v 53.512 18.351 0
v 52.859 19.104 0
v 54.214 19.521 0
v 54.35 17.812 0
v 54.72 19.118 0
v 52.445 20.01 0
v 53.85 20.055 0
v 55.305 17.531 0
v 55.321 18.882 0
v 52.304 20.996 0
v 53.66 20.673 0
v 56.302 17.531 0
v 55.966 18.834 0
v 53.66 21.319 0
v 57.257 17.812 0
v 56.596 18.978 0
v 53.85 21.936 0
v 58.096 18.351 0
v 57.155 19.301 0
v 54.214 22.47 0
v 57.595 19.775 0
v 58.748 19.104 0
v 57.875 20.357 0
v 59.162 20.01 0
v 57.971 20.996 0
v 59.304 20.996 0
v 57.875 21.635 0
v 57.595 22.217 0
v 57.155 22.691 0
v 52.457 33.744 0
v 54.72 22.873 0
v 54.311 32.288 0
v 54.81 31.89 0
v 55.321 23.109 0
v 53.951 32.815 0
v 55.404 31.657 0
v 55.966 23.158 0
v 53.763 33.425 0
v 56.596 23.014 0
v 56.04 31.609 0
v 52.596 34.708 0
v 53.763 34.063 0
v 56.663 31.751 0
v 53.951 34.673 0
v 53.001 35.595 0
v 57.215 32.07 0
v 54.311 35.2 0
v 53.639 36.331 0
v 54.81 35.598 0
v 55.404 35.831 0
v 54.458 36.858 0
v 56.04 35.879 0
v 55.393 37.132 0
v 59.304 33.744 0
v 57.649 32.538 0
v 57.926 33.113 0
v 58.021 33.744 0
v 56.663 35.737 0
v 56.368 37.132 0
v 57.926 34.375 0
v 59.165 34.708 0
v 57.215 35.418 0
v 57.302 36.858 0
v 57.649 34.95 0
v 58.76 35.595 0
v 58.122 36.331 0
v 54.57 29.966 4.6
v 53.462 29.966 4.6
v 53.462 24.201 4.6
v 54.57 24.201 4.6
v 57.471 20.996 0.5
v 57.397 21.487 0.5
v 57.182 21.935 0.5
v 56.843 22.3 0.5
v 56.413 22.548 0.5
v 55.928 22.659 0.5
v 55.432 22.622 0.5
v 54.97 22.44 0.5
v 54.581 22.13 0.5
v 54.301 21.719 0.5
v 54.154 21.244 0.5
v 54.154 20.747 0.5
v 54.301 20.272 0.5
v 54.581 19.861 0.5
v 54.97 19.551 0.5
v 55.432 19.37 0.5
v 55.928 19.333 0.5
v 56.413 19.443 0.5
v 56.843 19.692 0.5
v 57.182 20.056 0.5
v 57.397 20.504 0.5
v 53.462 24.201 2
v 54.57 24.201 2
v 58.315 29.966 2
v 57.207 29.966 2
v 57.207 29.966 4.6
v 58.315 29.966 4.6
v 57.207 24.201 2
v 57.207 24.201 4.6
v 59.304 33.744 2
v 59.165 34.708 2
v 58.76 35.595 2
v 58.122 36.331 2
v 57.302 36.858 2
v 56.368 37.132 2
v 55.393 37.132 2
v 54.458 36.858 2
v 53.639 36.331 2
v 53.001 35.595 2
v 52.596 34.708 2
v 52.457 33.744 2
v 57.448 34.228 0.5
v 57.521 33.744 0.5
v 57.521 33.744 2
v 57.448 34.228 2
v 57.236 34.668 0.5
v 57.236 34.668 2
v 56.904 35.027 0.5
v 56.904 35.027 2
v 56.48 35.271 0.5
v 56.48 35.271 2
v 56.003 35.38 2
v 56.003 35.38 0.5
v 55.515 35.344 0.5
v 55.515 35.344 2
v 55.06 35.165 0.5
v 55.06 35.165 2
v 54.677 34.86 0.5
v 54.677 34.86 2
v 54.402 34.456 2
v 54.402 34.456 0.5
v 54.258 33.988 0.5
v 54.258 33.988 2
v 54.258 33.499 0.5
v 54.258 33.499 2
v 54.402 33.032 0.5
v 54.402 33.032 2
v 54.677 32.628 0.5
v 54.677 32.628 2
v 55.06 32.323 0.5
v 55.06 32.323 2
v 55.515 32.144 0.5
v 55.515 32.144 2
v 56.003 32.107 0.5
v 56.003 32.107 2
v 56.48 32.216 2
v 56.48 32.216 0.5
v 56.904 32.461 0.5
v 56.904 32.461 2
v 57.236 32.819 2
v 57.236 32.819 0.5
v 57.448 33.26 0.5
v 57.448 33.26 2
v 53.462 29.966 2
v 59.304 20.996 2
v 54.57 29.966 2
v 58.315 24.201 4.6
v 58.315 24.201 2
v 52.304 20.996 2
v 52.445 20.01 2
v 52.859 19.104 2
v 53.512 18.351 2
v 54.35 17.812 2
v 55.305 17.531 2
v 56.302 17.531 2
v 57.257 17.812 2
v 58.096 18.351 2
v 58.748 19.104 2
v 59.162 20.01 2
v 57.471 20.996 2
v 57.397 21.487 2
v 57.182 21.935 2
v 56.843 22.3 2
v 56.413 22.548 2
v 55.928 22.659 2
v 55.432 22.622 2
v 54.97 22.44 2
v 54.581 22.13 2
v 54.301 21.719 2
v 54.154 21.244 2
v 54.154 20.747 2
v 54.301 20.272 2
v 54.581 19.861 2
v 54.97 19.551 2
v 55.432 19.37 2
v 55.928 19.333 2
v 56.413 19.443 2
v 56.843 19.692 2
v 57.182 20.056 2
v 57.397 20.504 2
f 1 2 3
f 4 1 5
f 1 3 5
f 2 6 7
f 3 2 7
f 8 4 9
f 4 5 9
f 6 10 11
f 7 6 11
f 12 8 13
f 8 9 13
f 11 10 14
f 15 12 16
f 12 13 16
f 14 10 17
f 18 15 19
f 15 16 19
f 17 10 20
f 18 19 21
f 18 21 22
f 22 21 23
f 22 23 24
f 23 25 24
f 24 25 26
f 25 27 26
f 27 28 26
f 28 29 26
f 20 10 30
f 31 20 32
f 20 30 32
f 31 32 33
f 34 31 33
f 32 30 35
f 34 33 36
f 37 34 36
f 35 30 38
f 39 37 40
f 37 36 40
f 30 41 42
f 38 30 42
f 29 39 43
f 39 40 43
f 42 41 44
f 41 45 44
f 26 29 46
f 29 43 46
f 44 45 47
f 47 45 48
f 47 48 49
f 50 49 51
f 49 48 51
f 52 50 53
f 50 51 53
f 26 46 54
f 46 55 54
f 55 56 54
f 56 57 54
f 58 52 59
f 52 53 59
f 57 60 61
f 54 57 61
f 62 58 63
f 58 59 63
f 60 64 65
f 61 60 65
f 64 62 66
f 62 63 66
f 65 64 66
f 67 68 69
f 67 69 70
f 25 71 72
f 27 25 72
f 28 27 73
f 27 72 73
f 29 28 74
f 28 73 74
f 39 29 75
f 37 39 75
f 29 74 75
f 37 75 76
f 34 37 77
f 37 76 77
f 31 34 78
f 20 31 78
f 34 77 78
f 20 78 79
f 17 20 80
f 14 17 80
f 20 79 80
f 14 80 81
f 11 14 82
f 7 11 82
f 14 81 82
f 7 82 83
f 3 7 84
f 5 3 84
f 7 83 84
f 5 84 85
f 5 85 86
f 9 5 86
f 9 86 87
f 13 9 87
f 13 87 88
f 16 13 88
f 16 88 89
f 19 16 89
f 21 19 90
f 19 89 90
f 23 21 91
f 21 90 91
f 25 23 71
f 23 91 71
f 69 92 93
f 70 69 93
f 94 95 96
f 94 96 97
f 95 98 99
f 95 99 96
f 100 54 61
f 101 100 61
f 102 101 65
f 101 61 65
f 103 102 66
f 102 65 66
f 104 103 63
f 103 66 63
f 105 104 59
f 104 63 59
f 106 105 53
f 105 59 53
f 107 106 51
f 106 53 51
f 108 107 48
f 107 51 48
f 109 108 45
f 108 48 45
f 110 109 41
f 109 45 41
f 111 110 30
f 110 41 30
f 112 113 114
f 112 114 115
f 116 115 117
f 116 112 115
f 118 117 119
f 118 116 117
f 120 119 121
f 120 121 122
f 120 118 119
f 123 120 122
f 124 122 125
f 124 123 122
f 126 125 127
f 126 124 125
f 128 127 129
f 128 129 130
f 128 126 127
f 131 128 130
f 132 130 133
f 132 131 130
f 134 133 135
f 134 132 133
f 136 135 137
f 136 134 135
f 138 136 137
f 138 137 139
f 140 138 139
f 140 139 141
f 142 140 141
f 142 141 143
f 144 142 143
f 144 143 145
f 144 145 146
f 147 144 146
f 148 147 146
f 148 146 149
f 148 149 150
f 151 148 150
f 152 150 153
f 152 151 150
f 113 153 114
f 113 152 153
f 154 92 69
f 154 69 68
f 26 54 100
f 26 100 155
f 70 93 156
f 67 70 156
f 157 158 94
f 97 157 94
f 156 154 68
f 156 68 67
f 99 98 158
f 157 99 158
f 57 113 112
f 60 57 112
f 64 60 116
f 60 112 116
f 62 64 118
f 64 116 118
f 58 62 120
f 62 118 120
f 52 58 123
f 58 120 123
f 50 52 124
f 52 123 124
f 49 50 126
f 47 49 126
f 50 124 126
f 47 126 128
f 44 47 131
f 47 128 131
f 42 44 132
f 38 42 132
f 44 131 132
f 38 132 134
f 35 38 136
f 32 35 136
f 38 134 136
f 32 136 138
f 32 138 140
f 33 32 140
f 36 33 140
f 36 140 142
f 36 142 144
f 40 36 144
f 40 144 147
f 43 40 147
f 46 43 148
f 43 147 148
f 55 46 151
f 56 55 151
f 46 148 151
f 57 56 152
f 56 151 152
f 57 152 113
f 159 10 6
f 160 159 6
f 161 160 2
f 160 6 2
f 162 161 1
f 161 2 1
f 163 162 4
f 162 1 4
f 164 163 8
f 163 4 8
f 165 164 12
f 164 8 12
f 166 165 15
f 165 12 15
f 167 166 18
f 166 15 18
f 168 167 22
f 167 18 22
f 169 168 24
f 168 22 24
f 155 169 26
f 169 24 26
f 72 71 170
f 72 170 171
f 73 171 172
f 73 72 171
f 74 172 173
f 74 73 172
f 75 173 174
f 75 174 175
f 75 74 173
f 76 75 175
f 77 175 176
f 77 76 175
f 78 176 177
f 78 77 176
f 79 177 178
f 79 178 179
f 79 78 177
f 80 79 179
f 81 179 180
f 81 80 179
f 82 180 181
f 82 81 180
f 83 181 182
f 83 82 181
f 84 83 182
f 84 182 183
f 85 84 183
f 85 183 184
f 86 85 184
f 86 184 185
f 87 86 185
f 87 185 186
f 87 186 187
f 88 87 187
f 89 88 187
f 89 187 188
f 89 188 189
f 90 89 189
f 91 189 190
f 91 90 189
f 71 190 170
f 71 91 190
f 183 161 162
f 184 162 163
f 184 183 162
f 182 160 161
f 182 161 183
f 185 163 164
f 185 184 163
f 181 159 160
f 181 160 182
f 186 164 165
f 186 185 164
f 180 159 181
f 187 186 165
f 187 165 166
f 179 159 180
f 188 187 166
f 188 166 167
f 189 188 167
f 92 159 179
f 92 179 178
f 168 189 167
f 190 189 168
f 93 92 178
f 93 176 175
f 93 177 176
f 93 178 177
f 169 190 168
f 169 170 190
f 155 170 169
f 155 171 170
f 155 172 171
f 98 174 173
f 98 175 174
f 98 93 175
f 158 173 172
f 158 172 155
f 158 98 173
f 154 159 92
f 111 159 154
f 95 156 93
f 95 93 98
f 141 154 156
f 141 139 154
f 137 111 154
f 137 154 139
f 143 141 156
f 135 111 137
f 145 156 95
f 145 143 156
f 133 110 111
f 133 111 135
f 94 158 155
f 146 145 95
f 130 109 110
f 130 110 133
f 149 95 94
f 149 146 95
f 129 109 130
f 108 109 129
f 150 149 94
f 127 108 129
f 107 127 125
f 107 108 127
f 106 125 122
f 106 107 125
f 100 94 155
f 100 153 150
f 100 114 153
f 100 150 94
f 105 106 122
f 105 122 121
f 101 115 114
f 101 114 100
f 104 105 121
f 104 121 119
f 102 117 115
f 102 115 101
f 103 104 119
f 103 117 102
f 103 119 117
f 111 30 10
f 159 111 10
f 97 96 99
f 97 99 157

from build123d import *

# Parameters (mm, degrees)
SKETCH023_R     = 1.640991
SKETCH023_R_2   = 1.667929
PAD017_DEPTH    = 2
SKETCH024_W     = 1.10811
SKETCH024_H     = 5.765145
PAD018_DEPTH    = 4.6
CHAMFER004_SIZE = 0.5


with BuildPart() as part:
    # Sketch023 → Pad017 (new body)
    with BuildSketch(Plane.XY):
        with BuildLine():
            ThreePointArc((59.303531, 33.743852), (55.880409, 37.166974), (52.457287, 33.743852))
            Line((52.457287, 33.743852), (52.303531, 20.99579))
            ThreePointArc((52.303531, 20.99579), (55.803531, 17.49579), (59.303531, 20.99579))
            Line((59.303531, 33.743852), (59.303531, 20.99579))
        make_face()
        with Locations((55.880409, 33.743852)):
            Circle(SKETCH023_R, mode=Mode.SUBTRACT)
        with Locations((55.803531, 20.99579)):
            Circle(SKETCH023_R_2, mode=Mode.SUBTRACT)
    extrude(amount=PAD017_DEPTH)

    # Sketch024 → Pad018 (join)
    with BuildSketch(Plane.XY):
        with Locations((54.015807, 27.08314)):
            Rectangle(SKETCH024_W, SKETCH024_H)
        with Locations((57.761141, 27.08314)):
            Rectangle(SKETCH024_W, SKETCH024_H)
    extrude(amount=PAD018_DEPTH)

    # Chamfer004
    chamfer004_edges = [part.edges().sort_by_distance(p)[0] for p in [
        (54.135602, 20.99579, 0),
        (54.239418, 33.743852, 0),
    ]]
    chamfer(chamfer004_edges, length=CHAMFER004_SIZE)


solid = part.part
